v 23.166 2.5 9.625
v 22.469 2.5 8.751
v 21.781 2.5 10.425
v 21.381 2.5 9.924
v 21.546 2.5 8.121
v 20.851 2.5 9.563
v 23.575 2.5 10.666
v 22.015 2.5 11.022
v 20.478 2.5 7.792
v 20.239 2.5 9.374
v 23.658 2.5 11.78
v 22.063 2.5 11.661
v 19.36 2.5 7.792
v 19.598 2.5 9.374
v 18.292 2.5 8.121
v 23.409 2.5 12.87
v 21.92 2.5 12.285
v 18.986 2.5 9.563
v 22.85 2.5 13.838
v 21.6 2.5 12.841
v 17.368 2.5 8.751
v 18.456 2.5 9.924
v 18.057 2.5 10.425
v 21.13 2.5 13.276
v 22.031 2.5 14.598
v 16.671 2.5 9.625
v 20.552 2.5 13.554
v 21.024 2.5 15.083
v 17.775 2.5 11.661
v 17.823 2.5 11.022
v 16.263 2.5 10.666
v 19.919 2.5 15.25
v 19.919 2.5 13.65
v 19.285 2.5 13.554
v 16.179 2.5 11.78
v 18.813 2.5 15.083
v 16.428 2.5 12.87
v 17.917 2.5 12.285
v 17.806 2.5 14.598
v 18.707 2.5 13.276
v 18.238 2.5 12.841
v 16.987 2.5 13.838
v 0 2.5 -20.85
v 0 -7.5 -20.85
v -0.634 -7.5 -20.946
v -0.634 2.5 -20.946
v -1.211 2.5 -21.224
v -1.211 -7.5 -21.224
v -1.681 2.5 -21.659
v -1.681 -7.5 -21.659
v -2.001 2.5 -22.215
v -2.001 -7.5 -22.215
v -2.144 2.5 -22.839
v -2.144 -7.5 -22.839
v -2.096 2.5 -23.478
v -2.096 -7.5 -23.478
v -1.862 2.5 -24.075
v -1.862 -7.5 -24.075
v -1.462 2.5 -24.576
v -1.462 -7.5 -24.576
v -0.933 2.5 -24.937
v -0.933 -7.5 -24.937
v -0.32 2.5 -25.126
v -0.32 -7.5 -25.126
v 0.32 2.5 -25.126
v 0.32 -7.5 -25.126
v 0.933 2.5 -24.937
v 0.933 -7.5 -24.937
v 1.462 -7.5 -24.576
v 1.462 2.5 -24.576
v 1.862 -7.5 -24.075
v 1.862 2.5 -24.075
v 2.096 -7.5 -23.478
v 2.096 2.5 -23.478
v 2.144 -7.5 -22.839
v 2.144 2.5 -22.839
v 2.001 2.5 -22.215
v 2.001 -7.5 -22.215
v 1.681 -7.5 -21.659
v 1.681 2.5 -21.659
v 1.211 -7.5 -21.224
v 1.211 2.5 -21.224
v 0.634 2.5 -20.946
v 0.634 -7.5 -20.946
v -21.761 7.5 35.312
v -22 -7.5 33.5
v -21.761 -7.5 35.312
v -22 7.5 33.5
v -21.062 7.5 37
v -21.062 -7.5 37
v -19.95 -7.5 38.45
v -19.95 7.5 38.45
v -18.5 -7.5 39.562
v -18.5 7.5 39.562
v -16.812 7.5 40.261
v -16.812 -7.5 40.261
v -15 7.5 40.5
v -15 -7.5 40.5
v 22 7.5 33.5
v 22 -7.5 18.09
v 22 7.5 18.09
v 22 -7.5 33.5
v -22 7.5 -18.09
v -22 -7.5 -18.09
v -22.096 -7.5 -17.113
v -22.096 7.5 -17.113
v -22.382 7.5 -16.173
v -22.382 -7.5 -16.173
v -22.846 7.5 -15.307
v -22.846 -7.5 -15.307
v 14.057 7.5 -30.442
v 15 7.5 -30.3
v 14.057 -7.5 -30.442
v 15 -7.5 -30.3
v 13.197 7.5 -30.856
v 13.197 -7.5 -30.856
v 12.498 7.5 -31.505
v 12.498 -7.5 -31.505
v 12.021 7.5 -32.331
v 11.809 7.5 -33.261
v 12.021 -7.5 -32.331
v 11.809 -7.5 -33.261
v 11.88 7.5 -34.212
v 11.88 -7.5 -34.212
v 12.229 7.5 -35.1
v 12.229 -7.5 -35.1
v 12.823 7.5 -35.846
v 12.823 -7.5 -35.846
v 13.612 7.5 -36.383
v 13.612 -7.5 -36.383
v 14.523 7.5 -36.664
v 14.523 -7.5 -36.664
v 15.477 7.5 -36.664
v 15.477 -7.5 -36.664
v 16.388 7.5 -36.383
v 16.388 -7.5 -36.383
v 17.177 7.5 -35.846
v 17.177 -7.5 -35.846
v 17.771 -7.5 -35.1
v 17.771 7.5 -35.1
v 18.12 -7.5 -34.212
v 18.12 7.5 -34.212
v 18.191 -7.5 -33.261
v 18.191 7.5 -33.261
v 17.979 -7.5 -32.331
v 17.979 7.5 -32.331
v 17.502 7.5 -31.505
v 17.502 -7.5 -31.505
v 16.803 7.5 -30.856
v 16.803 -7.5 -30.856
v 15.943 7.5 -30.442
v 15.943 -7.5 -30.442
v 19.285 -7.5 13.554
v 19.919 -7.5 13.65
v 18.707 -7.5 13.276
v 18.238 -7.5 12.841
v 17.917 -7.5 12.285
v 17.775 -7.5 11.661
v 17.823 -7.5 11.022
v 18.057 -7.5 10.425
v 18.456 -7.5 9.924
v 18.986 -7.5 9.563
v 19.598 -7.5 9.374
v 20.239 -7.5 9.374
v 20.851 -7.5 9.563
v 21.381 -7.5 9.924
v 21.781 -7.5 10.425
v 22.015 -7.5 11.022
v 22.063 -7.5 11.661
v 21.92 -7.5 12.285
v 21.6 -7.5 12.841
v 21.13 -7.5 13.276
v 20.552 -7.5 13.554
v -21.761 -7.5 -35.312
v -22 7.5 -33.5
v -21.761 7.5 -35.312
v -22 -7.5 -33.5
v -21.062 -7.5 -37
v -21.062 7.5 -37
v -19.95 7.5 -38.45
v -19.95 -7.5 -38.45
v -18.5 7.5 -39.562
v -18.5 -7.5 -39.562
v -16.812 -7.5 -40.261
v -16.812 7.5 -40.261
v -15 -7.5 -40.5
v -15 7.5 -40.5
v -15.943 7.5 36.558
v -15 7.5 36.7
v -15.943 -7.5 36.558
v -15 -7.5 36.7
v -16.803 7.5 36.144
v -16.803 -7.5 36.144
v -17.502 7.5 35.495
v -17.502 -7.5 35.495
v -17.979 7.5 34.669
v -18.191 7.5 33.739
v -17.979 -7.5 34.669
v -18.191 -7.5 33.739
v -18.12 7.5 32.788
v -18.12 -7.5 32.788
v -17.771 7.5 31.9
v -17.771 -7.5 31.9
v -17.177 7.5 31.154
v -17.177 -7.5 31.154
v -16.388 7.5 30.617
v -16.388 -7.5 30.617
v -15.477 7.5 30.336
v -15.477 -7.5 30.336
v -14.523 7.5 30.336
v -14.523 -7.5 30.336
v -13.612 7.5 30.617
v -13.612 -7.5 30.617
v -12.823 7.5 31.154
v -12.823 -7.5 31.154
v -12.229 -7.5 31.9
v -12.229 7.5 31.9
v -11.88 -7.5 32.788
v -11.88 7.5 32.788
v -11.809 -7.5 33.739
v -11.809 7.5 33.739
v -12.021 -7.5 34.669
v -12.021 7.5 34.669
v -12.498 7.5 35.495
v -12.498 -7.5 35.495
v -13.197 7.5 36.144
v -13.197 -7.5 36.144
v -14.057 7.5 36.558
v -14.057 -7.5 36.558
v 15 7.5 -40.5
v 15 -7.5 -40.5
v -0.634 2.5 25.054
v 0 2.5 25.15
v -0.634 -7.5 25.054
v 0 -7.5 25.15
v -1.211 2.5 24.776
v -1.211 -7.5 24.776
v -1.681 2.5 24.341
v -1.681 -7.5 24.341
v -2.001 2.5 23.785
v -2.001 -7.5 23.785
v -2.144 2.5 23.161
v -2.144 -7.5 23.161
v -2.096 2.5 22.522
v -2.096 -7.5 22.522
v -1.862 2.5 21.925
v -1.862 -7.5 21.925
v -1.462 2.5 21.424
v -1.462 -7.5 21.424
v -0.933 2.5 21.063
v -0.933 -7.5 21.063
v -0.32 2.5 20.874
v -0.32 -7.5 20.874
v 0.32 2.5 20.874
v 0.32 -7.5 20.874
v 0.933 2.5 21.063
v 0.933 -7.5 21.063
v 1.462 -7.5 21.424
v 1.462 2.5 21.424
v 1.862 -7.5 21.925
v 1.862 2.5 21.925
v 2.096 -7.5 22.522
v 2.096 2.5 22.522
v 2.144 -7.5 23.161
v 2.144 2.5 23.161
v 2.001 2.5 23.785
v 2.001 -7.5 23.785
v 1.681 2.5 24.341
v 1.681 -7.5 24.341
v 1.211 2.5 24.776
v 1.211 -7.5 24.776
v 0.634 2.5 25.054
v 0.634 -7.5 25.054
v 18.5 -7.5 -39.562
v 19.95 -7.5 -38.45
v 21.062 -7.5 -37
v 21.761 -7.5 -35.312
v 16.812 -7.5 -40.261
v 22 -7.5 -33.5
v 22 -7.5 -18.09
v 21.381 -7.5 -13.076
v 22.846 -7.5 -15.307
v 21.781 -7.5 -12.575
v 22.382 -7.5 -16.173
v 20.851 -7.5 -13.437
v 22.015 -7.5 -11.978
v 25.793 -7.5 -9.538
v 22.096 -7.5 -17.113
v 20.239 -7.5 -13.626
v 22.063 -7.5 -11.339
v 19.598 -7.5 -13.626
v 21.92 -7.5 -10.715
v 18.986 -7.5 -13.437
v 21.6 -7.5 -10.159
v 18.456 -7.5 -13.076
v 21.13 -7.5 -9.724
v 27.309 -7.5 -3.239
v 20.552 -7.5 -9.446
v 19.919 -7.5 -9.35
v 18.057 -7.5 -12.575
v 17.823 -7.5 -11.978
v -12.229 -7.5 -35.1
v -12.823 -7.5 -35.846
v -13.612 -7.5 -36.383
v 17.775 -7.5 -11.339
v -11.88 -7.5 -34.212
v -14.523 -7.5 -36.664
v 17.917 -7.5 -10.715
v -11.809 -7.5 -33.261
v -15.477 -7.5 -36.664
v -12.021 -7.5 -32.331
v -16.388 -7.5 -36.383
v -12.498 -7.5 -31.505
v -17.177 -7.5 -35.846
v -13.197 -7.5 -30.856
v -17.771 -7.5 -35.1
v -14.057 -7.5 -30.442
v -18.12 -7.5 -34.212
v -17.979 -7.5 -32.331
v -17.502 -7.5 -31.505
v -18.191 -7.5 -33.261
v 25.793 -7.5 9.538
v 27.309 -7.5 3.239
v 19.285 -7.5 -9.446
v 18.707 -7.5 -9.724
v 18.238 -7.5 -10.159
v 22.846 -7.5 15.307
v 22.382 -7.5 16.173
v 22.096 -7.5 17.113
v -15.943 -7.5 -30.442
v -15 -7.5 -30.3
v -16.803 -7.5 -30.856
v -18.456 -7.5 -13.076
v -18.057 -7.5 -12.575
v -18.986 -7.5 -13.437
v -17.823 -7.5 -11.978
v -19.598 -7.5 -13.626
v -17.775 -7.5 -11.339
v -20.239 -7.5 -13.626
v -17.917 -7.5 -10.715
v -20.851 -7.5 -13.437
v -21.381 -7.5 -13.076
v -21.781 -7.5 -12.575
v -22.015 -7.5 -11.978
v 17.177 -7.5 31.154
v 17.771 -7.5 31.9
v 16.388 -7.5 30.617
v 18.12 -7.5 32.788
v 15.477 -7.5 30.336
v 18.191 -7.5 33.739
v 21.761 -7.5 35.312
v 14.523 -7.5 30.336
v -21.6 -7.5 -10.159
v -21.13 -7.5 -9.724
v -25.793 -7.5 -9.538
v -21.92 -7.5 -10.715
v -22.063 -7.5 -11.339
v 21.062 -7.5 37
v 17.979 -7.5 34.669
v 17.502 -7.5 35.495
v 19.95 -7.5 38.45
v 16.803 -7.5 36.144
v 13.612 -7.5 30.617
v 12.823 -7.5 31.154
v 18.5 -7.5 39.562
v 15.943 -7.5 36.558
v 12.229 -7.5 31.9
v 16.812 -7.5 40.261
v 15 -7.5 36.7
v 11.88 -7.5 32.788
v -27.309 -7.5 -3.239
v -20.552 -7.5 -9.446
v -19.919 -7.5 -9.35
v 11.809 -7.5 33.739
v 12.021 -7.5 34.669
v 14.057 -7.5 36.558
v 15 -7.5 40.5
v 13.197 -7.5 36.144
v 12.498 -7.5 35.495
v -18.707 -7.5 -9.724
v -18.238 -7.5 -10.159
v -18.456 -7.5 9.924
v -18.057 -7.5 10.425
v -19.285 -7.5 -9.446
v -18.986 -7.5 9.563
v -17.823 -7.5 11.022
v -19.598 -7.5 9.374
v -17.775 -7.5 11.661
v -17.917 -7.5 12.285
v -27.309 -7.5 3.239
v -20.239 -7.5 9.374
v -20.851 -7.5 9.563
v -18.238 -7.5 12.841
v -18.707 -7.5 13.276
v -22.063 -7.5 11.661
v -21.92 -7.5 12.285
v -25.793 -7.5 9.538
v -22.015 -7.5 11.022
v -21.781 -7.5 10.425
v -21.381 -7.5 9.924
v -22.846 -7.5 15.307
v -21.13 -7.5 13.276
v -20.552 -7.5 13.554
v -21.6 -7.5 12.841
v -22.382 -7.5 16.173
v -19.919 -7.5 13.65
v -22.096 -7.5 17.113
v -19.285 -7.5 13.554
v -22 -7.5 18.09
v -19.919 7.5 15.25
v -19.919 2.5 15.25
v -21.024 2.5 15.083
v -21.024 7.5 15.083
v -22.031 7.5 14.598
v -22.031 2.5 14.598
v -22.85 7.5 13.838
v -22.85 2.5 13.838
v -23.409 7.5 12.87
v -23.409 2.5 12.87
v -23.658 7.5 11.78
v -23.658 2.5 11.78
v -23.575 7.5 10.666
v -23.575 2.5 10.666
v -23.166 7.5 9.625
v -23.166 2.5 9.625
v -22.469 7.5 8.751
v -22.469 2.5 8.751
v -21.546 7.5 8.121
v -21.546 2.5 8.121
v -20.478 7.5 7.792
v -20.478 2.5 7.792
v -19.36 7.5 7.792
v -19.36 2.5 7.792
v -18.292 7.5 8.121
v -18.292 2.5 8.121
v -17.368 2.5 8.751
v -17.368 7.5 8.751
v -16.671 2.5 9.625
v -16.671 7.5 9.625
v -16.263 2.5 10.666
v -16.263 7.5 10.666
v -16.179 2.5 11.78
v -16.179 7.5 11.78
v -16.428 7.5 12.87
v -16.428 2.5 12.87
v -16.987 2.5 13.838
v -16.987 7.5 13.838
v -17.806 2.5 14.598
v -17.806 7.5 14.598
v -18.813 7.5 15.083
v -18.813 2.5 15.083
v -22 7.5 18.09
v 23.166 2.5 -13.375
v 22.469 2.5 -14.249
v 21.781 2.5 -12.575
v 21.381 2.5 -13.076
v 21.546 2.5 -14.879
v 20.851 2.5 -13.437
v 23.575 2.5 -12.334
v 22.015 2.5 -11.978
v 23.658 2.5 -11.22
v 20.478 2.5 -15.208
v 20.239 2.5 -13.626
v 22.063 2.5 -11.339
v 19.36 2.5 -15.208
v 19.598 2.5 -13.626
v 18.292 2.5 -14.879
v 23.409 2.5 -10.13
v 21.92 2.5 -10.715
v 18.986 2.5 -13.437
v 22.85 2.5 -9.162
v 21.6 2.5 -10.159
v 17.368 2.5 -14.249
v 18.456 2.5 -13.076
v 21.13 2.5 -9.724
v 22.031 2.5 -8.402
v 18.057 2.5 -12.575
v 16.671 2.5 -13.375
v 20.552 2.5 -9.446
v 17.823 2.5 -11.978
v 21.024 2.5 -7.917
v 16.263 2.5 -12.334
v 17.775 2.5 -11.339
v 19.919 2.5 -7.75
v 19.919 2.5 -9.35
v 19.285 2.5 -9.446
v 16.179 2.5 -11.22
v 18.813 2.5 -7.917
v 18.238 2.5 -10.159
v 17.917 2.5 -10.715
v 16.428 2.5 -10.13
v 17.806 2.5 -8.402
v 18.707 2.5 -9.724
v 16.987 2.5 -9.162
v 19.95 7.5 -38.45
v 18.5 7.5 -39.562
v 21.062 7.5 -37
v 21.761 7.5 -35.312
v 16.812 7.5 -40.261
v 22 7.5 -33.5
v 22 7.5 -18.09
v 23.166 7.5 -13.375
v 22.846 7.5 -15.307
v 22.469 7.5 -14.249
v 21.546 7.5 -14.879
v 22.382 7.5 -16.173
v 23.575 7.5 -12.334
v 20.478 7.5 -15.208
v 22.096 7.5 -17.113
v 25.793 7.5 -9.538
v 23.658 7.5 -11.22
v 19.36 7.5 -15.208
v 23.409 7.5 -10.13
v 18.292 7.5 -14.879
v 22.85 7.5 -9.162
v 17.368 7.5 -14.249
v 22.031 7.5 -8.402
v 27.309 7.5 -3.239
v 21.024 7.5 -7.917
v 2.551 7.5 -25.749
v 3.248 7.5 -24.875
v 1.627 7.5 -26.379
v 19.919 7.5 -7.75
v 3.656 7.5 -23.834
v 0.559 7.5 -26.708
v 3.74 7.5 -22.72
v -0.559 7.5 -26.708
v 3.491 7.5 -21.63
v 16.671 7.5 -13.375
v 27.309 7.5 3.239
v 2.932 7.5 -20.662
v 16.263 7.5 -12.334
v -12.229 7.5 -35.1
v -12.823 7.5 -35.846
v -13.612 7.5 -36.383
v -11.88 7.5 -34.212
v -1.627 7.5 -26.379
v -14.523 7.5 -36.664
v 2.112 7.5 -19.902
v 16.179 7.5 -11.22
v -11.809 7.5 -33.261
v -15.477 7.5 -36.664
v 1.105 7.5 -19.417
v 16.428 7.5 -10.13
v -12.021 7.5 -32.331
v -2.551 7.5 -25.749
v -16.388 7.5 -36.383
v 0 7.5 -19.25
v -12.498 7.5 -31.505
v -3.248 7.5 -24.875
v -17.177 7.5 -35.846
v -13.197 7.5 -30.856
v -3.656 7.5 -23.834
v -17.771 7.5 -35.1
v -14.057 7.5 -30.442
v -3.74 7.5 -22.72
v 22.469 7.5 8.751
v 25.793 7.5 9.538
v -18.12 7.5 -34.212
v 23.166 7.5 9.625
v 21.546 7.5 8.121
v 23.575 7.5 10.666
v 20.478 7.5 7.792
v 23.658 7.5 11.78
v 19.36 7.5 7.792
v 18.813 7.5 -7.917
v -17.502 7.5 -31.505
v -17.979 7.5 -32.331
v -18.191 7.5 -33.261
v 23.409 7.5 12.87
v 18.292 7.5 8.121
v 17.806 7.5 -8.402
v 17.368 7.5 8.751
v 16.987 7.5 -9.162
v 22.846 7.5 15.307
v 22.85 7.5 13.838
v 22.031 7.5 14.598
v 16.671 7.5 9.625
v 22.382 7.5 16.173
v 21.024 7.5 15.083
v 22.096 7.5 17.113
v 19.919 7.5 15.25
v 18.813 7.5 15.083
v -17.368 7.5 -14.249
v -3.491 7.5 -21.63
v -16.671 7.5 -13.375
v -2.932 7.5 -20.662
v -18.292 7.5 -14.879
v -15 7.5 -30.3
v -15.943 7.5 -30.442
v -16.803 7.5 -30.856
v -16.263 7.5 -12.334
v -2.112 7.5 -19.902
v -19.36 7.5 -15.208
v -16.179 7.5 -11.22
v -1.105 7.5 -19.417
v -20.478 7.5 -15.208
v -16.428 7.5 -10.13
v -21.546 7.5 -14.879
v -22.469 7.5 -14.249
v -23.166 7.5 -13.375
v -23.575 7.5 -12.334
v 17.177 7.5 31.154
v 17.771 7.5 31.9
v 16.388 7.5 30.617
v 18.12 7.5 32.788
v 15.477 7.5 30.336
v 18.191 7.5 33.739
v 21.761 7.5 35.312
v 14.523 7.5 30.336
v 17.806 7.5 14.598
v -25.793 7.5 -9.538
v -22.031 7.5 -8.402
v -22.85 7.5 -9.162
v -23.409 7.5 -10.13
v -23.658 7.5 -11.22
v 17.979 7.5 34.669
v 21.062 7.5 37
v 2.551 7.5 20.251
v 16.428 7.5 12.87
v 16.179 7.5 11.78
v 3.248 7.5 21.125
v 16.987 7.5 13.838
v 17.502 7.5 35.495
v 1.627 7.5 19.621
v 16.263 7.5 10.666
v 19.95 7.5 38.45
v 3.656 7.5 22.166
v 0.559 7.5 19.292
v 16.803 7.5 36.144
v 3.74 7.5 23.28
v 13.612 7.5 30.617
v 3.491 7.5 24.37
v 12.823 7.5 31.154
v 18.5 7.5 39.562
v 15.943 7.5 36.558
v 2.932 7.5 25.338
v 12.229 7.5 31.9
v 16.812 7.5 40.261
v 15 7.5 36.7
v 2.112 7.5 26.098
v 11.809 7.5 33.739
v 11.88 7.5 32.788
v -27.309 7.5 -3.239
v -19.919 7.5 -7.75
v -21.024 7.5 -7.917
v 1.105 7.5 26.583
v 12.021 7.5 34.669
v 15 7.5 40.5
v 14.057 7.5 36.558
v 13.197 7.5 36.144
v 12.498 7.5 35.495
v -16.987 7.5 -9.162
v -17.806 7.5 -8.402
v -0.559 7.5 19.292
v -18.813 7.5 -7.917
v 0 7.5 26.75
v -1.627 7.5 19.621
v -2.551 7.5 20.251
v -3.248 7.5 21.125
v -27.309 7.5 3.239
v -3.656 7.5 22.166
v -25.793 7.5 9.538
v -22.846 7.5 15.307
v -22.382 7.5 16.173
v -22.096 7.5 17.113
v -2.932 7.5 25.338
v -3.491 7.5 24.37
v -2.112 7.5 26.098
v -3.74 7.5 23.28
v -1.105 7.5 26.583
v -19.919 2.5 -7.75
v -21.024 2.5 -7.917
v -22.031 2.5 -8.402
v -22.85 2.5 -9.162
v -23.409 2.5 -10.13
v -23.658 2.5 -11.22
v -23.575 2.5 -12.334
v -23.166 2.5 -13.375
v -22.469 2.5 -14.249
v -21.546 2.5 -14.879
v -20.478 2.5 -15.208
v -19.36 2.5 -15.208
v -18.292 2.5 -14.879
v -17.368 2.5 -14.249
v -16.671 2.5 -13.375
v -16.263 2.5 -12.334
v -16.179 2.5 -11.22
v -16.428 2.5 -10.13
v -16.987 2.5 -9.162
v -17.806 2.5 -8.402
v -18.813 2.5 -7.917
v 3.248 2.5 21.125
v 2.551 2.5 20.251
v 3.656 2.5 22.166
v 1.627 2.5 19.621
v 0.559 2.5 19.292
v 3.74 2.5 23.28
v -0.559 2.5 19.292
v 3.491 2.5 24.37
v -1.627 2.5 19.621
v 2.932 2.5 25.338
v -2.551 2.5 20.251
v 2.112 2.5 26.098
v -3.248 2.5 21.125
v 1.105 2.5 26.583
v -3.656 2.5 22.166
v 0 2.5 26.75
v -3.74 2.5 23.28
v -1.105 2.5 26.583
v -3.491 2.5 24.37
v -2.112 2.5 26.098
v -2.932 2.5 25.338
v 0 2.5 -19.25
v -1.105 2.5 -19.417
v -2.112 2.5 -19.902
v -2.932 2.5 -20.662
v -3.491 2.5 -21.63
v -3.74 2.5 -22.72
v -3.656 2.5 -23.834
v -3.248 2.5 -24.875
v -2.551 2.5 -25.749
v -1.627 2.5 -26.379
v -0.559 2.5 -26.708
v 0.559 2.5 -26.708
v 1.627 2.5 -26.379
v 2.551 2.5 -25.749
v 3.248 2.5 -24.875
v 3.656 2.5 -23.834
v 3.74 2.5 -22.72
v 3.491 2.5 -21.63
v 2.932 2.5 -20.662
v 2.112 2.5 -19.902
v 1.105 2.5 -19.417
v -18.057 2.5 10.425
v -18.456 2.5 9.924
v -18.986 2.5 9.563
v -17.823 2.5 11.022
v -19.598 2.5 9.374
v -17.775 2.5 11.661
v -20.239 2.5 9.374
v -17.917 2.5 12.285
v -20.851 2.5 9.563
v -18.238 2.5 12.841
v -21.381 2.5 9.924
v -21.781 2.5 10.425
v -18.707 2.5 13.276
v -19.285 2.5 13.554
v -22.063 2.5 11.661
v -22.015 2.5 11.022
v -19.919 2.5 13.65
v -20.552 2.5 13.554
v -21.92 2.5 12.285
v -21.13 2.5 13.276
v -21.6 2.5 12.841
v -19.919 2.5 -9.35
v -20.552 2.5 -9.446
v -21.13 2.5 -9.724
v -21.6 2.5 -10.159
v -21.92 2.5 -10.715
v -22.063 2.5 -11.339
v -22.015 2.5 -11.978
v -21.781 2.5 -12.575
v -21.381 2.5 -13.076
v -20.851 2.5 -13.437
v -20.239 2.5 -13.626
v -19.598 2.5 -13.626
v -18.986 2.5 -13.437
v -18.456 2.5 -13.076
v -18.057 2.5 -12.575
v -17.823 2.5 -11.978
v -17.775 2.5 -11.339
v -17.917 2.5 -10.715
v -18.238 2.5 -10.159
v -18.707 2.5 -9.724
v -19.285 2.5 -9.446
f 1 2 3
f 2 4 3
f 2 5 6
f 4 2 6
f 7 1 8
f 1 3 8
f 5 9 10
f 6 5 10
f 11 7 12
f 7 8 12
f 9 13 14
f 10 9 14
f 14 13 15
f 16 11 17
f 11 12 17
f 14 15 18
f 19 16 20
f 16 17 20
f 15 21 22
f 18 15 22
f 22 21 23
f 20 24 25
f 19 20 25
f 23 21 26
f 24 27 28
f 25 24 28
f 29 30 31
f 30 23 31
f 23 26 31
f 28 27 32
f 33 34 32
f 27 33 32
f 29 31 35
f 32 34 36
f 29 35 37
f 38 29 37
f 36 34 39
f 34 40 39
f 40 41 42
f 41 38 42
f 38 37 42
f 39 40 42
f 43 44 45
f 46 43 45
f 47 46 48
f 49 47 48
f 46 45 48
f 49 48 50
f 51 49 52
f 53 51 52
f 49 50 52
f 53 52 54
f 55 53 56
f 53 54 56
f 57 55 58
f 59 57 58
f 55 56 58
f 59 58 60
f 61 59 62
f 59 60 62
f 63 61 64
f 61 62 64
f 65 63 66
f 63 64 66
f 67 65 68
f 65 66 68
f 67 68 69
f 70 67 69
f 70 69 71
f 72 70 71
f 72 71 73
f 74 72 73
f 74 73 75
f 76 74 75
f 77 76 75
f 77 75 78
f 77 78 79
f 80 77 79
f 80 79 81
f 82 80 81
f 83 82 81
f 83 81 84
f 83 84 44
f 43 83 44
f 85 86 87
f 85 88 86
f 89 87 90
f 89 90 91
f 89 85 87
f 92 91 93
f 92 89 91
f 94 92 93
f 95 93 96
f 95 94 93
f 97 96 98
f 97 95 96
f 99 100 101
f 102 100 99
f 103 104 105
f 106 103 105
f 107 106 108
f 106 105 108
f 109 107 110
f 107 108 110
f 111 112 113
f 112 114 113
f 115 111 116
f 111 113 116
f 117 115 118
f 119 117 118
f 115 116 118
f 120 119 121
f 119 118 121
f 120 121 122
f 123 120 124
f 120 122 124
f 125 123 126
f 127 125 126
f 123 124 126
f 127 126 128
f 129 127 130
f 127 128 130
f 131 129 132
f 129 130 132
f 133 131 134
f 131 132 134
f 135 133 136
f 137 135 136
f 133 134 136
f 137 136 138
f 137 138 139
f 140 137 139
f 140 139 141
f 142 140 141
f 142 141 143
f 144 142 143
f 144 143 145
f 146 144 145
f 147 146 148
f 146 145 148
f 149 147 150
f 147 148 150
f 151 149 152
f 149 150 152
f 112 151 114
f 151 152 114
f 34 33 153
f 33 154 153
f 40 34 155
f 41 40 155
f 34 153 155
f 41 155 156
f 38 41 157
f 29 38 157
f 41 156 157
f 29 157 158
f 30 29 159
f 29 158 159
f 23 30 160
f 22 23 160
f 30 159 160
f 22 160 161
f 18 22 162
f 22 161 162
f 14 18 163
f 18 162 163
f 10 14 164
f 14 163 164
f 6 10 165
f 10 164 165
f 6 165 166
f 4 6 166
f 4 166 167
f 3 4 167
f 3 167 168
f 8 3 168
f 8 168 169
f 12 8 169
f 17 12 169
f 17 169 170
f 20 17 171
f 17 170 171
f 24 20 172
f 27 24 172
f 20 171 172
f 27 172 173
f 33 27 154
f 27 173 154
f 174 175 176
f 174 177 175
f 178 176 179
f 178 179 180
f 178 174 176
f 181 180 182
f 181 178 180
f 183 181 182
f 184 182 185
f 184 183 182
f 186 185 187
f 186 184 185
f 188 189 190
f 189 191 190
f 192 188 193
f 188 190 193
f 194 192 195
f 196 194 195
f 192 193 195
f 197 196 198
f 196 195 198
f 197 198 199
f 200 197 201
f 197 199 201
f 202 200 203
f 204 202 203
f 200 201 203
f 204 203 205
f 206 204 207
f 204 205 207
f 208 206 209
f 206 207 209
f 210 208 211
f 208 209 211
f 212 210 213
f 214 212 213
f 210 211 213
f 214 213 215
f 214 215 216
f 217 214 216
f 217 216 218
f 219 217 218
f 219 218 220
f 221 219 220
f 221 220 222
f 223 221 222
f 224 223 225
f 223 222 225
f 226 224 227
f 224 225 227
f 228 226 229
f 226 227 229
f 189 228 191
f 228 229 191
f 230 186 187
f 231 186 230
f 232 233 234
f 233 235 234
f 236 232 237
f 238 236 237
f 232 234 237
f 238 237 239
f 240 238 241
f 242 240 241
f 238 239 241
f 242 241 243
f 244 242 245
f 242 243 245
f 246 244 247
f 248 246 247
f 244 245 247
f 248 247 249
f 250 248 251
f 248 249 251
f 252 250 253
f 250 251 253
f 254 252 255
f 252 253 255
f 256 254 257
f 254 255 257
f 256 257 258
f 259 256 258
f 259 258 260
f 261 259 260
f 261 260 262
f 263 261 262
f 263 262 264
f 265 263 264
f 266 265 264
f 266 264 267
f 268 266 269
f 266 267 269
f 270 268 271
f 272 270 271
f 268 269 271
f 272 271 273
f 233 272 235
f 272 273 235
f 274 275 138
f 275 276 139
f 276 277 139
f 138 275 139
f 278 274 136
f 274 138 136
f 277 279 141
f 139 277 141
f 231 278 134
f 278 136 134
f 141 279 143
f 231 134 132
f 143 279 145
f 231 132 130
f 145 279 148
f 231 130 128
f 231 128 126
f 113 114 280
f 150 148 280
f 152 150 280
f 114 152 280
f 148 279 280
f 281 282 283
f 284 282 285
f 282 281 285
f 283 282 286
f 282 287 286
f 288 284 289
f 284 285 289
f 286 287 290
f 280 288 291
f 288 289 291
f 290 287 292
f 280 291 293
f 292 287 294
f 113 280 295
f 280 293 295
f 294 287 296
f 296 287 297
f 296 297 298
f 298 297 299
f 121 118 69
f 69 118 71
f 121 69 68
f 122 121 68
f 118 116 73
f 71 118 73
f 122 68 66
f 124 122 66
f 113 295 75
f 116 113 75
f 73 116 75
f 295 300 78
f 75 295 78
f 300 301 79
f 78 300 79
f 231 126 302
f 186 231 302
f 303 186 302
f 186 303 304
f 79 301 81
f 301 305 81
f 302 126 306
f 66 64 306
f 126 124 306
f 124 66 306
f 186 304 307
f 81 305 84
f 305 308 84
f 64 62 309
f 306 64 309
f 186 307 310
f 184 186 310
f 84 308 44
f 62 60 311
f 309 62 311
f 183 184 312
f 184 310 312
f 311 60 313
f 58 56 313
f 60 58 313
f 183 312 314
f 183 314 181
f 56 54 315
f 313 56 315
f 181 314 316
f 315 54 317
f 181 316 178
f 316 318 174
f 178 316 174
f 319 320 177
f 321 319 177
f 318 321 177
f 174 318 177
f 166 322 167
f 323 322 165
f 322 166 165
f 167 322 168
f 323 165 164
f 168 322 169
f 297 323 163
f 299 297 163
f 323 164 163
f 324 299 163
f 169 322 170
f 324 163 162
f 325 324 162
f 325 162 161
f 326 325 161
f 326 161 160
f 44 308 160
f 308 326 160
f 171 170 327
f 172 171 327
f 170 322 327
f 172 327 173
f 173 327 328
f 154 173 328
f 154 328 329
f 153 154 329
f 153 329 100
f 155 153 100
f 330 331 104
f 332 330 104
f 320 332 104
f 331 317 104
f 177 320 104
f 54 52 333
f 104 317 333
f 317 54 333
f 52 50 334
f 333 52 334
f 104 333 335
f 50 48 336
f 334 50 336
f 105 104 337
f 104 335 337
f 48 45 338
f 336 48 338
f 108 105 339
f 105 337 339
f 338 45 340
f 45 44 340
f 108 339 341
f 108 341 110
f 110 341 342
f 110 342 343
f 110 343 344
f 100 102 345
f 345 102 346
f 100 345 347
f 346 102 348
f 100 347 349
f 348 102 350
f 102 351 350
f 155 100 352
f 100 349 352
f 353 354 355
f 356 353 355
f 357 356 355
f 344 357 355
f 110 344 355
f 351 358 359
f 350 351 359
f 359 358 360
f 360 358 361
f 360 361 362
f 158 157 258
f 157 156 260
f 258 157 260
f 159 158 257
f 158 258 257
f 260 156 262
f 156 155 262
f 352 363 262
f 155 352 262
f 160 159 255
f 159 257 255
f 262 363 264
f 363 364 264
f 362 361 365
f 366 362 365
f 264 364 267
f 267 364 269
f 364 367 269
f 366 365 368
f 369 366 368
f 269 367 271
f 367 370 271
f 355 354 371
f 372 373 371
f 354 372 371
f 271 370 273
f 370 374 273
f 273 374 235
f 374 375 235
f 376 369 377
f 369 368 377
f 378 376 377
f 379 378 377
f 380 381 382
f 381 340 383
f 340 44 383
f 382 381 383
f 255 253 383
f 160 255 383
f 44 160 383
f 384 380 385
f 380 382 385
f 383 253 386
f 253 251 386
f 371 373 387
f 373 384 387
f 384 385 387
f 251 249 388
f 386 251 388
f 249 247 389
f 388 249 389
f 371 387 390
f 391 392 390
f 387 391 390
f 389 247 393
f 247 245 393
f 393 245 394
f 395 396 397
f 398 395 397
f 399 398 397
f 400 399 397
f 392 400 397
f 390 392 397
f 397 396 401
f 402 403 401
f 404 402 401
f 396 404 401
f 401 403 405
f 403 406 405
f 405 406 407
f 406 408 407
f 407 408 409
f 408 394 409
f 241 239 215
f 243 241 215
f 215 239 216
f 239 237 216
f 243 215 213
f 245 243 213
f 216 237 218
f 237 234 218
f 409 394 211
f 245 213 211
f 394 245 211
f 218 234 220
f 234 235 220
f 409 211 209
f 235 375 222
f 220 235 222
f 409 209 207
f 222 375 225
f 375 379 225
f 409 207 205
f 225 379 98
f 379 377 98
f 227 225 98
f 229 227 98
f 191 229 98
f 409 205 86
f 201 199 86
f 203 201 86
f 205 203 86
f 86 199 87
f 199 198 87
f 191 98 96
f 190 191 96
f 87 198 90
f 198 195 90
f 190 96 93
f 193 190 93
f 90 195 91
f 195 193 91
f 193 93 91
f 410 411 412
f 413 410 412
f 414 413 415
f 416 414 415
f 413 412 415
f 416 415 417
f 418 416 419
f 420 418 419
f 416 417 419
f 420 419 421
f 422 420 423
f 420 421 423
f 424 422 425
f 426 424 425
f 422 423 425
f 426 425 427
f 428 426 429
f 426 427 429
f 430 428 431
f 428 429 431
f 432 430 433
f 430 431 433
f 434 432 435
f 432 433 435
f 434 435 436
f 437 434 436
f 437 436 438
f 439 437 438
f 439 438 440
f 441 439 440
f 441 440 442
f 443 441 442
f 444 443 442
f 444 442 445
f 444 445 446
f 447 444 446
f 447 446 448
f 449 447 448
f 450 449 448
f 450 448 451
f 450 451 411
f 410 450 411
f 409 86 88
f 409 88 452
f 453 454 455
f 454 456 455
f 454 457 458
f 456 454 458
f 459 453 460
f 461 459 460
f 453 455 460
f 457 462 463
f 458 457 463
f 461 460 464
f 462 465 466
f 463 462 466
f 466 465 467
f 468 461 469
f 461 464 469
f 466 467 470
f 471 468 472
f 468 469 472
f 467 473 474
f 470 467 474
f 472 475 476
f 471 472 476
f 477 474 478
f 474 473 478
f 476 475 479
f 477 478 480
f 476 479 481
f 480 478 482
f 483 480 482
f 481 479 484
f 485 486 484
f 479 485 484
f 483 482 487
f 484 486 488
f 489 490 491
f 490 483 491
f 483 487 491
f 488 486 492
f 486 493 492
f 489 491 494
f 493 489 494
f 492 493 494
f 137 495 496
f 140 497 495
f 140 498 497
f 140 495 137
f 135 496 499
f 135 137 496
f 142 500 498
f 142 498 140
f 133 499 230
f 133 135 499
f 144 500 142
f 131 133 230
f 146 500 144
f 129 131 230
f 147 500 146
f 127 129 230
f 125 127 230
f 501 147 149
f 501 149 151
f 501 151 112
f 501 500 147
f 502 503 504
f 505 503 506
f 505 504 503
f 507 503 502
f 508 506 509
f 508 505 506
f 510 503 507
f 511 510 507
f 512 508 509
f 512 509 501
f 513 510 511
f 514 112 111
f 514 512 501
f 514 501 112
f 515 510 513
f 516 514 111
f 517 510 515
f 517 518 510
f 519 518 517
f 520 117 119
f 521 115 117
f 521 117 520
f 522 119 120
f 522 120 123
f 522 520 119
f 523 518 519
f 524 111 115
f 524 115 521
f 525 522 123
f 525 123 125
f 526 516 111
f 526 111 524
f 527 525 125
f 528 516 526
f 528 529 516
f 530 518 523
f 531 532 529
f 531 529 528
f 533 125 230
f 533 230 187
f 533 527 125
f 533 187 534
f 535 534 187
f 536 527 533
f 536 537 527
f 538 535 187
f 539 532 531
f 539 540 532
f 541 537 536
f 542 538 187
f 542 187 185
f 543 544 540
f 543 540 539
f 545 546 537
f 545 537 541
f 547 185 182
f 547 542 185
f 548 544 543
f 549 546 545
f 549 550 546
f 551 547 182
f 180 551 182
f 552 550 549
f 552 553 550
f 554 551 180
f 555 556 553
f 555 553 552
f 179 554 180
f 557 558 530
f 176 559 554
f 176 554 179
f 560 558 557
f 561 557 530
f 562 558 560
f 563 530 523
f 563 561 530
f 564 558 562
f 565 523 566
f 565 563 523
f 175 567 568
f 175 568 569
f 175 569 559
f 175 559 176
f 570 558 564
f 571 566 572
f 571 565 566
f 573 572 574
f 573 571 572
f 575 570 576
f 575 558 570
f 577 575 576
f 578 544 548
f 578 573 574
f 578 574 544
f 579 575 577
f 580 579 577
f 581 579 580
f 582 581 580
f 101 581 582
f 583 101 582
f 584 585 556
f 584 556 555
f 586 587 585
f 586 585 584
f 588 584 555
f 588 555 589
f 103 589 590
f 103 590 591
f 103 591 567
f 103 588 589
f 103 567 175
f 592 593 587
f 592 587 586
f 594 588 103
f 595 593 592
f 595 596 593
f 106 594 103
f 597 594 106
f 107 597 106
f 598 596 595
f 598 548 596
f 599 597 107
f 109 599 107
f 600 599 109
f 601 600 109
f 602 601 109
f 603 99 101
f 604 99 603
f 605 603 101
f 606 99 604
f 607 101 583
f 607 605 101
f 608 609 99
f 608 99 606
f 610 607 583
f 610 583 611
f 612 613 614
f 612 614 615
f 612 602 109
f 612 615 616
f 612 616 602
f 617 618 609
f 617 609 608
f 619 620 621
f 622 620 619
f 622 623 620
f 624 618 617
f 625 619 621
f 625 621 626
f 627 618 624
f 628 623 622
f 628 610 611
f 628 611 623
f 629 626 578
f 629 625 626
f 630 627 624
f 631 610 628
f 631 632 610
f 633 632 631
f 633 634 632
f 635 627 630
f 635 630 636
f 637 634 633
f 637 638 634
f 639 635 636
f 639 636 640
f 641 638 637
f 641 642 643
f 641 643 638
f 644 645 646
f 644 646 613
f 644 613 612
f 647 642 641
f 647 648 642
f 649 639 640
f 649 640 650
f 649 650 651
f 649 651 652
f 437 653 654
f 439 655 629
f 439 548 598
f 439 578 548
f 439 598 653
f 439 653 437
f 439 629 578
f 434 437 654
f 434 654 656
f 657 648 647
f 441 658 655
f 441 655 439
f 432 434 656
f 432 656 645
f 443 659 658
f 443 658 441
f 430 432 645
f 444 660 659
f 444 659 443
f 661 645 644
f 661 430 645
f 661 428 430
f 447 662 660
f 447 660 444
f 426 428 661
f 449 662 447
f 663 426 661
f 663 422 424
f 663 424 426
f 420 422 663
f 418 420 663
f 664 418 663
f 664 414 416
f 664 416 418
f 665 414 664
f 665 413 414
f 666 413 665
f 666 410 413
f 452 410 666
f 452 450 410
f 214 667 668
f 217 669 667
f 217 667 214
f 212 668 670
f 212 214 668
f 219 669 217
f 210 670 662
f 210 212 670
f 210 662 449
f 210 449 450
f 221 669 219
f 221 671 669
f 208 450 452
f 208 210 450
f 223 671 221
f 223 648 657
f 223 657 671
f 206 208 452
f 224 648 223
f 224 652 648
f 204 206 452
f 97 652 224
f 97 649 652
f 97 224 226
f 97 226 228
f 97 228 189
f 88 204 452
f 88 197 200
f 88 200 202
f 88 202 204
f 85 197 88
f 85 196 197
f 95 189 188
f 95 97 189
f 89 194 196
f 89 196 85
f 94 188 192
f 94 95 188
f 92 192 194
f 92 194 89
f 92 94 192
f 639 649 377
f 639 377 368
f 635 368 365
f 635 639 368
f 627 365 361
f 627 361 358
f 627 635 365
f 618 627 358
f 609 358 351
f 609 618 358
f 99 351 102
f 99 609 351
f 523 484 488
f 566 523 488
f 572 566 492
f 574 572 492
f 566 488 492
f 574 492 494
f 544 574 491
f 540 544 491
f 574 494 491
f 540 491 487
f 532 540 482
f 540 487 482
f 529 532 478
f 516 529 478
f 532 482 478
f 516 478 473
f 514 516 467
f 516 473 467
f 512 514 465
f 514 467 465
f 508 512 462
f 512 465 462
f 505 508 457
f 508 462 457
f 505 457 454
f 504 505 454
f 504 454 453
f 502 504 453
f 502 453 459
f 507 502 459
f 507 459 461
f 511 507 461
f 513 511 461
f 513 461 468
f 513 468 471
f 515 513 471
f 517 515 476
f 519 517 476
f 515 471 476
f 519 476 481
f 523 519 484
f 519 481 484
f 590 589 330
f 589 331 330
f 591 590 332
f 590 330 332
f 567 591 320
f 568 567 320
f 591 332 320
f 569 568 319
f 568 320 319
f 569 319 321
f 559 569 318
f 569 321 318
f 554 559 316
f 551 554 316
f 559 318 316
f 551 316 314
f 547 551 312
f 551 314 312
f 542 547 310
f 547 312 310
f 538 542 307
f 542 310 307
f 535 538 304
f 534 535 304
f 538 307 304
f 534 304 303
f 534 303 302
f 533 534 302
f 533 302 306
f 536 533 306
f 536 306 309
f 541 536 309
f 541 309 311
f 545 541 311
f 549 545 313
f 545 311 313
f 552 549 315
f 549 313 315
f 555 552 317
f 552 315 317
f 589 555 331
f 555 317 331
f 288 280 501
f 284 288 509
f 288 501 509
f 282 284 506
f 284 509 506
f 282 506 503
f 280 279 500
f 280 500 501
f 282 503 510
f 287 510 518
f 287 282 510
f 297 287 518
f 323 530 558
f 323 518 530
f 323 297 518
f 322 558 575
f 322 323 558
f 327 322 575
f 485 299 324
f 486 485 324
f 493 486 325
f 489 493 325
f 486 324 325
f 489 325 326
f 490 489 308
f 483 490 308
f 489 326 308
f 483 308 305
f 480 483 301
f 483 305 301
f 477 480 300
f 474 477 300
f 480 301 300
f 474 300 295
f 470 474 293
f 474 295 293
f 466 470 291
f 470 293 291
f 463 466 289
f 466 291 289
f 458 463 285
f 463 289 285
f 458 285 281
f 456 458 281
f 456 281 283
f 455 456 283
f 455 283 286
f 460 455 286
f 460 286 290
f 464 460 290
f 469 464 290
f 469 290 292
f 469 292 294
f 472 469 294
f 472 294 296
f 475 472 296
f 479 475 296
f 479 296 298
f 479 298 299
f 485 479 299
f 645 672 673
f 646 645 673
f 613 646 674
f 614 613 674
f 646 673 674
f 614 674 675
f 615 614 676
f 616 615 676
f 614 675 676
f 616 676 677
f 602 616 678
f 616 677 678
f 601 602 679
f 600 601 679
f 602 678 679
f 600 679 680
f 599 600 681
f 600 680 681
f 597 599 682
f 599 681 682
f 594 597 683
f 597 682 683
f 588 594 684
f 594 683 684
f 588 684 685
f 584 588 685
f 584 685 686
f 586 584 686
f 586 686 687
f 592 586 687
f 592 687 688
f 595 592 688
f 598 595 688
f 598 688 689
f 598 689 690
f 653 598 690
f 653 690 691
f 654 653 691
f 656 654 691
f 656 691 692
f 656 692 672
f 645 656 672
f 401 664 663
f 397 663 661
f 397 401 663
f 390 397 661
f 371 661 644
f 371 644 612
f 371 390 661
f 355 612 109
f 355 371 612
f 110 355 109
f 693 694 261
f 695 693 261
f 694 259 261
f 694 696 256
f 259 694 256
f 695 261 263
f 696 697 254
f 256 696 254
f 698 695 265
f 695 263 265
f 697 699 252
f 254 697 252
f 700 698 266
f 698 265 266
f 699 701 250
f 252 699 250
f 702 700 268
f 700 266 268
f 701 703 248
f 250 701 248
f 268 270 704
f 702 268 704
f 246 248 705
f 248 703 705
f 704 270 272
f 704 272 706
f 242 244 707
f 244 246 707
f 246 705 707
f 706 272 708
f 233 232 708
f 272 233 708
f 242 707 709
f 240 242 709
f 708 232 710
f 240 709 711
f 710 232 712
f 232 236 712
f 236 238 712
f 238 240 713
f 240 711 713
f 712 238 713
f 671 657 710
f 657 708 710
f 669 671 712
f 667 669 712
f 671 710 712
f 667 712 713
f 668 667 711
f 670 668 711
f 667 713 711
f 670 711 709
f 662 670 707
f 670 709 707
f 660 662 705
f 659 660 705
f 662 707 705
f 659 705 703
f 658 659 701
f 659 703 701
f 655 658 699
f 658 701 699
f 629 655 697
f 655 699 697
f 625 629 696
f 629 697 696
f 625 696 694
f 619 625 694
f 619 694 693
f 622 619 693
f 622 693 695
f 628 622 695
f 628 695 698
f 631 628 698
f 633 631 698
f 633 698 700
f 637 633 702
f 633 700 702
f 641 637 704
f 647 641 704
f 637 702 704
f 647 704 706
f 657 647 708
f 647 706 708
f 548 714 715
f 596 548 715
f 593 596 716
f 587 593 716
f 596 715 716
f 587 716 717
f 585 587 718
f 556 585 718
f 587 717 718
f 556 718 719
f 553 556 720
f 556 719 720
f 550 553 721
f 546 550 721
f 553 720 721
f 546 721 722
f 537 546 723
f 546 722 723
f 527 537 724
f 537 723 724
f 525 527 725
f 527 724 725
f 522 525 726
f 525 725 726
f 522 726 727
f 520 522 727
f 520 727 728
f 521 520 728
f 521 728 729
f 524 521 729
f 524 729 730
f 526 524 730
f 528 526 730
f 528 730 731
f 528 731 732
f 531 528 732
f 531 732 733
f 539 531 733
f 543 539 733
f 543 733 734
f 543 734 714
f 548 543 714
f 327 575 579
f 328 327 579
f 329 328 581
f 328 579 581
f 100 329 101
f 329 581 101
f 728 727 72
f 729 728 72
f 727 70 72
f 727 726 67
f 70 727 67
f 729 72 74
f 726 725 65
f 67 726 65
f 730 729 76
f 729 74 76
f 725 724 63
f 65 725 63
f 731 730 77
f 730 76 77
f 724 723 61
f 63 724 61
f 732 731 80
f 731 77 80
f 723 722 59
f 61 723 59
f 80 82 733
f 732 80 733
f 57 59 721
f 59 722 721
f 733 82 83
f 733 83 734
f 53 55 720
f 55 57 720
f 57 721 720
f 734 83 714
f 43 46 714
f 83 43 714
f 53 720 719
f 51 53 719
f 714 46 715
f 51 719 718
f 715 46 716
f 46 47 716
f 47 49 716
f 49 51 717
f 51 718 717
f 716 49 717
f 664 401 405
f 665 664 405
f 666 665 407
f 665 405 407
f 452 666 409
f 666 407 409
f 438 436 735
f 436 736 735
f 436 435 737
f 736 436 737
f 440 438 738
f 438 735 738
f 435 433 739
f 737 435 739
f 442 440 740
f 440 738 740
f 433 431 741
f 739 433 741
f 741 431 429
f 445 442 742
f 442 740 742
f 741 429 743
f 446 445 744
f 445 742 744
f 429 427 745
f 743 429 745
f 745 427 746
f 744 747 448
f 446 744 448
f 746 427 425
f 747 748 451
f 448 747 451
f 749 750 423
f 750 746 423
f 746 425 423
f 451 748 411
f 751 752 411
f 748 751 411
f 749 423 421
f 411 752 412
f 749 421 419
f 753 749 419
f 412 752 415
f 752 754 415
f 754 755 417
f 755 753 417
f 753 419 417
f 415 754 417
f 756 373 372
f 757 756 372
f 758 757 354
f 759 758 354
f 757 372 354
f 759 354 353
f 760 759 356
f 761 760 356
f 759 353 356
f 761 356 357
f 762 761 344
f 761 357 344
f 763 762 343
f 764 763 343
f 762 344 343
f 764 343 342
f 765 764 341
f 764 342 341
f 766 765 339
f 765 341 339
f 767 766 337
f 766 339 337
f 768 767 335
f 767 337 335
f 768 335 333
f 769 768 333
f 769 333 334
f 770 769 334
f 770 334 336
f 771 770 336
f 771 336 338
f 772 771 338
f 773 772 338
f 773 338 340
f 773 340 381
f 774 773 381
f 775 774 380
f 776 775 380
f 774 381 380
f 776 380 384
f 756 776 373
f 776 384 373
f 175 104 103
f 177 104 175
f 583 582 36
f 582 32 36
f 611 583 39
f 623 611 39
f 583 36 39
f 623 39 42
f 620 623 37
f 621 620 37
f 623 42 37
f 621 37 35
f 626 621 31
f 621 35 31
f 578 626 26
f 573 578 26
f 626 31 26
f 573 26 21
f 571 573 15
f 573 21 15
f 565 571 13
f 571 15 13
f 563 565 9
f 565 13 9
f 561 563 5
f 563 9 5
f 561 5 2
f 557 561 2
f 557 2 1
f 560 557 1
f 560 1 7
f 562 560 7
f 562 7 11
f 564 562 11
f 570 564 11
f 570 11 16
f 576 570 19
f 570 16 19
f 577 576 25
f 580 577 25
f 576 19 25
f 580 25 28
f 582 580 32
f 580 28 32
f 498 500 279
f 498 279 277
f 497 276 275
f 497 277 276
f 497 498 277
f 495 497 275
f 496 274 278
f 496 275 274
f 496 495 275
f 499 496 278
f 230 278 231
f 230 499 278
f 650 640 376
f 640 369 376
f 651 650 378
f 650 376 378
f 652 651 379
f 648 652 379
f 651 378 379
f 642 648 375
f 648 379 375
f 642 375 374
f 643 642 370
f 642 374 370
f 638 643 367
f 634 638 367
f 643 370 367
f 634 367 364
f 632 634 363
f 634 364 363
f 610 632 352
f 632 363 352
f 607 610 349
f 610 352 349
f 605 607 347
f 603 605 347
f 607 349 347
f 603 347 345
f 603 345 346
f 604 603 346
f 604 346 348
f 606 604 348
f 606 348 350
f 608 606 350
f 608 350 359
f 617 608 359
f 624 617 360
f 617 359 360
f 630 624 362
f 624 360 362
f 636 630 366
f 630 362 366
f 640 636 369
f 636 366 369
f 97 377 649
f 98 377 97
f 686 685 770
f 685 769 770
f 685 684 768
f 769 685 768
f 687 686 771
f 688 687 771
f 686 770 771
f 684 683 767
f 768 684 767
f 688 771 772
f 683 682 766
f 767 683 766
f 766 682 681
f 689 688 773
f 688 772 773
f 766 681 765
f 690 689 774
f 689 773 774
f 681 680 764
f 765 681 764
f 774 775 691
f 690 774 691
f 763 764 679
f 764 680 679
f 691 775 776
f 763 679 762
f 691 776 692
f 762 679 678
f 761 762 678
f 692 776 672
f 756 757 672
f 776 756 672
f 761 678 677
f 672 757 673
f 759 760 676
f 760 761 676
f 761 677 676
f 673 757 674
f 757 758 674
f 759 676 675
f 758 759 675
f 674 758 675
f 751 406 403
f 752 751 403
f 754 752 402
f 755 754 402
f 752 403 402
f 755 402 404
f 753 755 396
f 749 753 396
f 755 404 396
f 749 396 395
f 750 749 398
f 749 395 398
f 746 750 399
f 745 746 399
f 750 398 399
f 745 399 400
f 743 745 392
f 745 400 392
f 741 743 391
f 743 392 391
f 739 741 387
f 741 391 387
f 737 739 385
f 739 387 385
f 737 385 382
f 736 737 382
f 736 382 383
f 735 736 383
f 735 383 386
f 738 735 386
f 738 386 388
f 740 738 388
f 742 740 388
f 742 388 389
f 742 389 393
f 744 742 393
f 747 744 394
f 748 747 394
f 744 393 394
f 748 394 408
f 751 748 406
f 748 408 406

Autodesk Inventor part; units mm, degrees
ref_plane "YZ Plane" through (0, 0, 0) normal (1, 0, 0) x (0, 1, 0)
ref_plane "XZ Plane" through (0, 0, 0) normal (0, 1, 0) x (-1, 0, 0)
ref_plane "XY Plane" through (0, 0, 0) normal (0, 0, 1) x (1, 0, 0)
sketch "スケッチ1" plane through (0, 0, 0) normal (0, 1, 0) x (-1, 0, 0)
  line L0 (27.5, 27.5) -> (-27.5, 27.5)
  line L1 (-27.5, 27.5) -> (-27.5, -27.5)
  line L2 (-27.5, -27.5) -> (27.5, -27.5)
  line L3 (27.5, -27.5) -> (27.5, 27.5)
  line L4 (27.5, 27.5) -> (-27.5, -27.5) construction
  line L5 (-27.5, 27.5) -> (27.5, -27.5) construction
  line L6 (15, 33.5) -> (-15, 33.5) construction
  line L7 (-15, 33.5) -> (-15, -33.5) construction
  line L8 (-15, -33.5) -> (15, -33.5) construction
  line L9 (15, -33.5) -> (15, 33.5) construction
  line L10 (15, 33.5) -> (-15, -33.5) construction
  line L11 (-15, 33.5) -> (15, -33.5) construction
  circle A0 centre (-15, 33.5) radius 5 construction
  circle A1 centre (0, 0) radius 27.5
  line L12 (22, -40.5) -> (-22, -40.5)
  line L13 (-22, -40.5) -> (-22, 40.5)
  line L14 (-22, 40.5) -> (22, 40.5)
  line L15 (22, 40.5) -> (22, -40.5)
  line L16 (22, -40.5) -> (-22, 40.5) construction
  line L17 (-22, -40.5) -> (22, 40.5) construction
  point P0 (-22, -16.5)
  point P1 (22, -16.5)
  point P2 (22, 16.5)
  point P3 (-22, 16.5)
  dimension "d44" = 55
  dimension "d45" = 10
  dimension "d46" = 6
  dimension "d53" = 55
  dimension "d54" = 30
  dimension "d55" = 7
  dimension "d56" = 7
extrude "押し出し1" add sketch "スケッチ1" along normal mid plane 15 contours L15 A1 L0 | L0 L13 L14 L15 | A1 L15 | A1 L13 L0 | A1 L15 L13 | L15 L2 A1 | L13 A1 | L15 L12 L13 L2 | L2 L13 A1
sketch "スケッチ2" plane through (-1, 7.5, 27) normal (0, -1, 0) x (1, 0, 0)
  line L0 (-14, -60.5) -> (16, -60.5)
  line L1 (16, -60.5) -> (16, 6.5)
  line L2 (16, 6.5) -> (-14, 6.5)
  line L3 (-14, 6.5) -> (-14, -60.5)
  line L4 (-14, -60.5) -> (16, 6.5) construction
  line L5 (16, -60.5) -> (-14, 6.5) construction
  line L6 (-21, 13.5) -> (23, 13.5) projected
  point P0 (1, -27)
  dimension "d52" = 30
  dimension "d58" = 7
hole "穴1" at (-15, 7.5, 33.5) at (15, 7.5, 33.5) at (15, 7.5, -33.5) at (-15, 7.5, -33.5) direction (0, -1, 0) diameter 6.4 end through all clearance for "Flat Head Machine Screw" size "M6" standard "Ansi Metric M Profile"
sketch "スケッチ5" plane through (-26, 7.5, 26) normal (0, 1, 0) x (1, 0, 0)
  circle A0 centre (26, 26) radius 23
  point P0 (26, 26)
  point P1 (26, 49)
  point P2 (26, 26)
  point P3 (6.0814, 37.5)
  point P4 (26, 26)
  point P5 (6.0814, 14.5)
  point P6 (26, 26)
  point P7 (26, 3)
  point P8 (26, 26)
  point P9 (45.9186, 14.5)
  point P10 (26, 26)
  point P11 (45.9186, 37.5)
  dimension "d31" = 46
  dimension "d34" = 360
hole "穴4" at (19.9186, 7.5, -11.5) at (19.9186, 7.5, 11.5) at (0, 7.5, 23) at (-19.9186, 7.5, 11.5) at (-19.9186, 7.5, -11.5) at (0, 7.5, -23) direction (0, -1, 0) diameter 4.3 end through all counterbore diameter 7.5 counterbore depth 5 clearance for "Socket Head Cap Screw" size "M4" standard "Ansi Metric M Profile"
fillet "フィレット2" radius 7 4 edges at (-22, 0, 40.5) (22, 0, 40.5) (22, 0, -40.5) (-22, 0, -40.5)
fillet "フィレット3" radius 5 4 edges at (-22, 0, -16.5) (-22, 0, 16.5) (22, 0, -16.5) (22, 0, 16.5)
